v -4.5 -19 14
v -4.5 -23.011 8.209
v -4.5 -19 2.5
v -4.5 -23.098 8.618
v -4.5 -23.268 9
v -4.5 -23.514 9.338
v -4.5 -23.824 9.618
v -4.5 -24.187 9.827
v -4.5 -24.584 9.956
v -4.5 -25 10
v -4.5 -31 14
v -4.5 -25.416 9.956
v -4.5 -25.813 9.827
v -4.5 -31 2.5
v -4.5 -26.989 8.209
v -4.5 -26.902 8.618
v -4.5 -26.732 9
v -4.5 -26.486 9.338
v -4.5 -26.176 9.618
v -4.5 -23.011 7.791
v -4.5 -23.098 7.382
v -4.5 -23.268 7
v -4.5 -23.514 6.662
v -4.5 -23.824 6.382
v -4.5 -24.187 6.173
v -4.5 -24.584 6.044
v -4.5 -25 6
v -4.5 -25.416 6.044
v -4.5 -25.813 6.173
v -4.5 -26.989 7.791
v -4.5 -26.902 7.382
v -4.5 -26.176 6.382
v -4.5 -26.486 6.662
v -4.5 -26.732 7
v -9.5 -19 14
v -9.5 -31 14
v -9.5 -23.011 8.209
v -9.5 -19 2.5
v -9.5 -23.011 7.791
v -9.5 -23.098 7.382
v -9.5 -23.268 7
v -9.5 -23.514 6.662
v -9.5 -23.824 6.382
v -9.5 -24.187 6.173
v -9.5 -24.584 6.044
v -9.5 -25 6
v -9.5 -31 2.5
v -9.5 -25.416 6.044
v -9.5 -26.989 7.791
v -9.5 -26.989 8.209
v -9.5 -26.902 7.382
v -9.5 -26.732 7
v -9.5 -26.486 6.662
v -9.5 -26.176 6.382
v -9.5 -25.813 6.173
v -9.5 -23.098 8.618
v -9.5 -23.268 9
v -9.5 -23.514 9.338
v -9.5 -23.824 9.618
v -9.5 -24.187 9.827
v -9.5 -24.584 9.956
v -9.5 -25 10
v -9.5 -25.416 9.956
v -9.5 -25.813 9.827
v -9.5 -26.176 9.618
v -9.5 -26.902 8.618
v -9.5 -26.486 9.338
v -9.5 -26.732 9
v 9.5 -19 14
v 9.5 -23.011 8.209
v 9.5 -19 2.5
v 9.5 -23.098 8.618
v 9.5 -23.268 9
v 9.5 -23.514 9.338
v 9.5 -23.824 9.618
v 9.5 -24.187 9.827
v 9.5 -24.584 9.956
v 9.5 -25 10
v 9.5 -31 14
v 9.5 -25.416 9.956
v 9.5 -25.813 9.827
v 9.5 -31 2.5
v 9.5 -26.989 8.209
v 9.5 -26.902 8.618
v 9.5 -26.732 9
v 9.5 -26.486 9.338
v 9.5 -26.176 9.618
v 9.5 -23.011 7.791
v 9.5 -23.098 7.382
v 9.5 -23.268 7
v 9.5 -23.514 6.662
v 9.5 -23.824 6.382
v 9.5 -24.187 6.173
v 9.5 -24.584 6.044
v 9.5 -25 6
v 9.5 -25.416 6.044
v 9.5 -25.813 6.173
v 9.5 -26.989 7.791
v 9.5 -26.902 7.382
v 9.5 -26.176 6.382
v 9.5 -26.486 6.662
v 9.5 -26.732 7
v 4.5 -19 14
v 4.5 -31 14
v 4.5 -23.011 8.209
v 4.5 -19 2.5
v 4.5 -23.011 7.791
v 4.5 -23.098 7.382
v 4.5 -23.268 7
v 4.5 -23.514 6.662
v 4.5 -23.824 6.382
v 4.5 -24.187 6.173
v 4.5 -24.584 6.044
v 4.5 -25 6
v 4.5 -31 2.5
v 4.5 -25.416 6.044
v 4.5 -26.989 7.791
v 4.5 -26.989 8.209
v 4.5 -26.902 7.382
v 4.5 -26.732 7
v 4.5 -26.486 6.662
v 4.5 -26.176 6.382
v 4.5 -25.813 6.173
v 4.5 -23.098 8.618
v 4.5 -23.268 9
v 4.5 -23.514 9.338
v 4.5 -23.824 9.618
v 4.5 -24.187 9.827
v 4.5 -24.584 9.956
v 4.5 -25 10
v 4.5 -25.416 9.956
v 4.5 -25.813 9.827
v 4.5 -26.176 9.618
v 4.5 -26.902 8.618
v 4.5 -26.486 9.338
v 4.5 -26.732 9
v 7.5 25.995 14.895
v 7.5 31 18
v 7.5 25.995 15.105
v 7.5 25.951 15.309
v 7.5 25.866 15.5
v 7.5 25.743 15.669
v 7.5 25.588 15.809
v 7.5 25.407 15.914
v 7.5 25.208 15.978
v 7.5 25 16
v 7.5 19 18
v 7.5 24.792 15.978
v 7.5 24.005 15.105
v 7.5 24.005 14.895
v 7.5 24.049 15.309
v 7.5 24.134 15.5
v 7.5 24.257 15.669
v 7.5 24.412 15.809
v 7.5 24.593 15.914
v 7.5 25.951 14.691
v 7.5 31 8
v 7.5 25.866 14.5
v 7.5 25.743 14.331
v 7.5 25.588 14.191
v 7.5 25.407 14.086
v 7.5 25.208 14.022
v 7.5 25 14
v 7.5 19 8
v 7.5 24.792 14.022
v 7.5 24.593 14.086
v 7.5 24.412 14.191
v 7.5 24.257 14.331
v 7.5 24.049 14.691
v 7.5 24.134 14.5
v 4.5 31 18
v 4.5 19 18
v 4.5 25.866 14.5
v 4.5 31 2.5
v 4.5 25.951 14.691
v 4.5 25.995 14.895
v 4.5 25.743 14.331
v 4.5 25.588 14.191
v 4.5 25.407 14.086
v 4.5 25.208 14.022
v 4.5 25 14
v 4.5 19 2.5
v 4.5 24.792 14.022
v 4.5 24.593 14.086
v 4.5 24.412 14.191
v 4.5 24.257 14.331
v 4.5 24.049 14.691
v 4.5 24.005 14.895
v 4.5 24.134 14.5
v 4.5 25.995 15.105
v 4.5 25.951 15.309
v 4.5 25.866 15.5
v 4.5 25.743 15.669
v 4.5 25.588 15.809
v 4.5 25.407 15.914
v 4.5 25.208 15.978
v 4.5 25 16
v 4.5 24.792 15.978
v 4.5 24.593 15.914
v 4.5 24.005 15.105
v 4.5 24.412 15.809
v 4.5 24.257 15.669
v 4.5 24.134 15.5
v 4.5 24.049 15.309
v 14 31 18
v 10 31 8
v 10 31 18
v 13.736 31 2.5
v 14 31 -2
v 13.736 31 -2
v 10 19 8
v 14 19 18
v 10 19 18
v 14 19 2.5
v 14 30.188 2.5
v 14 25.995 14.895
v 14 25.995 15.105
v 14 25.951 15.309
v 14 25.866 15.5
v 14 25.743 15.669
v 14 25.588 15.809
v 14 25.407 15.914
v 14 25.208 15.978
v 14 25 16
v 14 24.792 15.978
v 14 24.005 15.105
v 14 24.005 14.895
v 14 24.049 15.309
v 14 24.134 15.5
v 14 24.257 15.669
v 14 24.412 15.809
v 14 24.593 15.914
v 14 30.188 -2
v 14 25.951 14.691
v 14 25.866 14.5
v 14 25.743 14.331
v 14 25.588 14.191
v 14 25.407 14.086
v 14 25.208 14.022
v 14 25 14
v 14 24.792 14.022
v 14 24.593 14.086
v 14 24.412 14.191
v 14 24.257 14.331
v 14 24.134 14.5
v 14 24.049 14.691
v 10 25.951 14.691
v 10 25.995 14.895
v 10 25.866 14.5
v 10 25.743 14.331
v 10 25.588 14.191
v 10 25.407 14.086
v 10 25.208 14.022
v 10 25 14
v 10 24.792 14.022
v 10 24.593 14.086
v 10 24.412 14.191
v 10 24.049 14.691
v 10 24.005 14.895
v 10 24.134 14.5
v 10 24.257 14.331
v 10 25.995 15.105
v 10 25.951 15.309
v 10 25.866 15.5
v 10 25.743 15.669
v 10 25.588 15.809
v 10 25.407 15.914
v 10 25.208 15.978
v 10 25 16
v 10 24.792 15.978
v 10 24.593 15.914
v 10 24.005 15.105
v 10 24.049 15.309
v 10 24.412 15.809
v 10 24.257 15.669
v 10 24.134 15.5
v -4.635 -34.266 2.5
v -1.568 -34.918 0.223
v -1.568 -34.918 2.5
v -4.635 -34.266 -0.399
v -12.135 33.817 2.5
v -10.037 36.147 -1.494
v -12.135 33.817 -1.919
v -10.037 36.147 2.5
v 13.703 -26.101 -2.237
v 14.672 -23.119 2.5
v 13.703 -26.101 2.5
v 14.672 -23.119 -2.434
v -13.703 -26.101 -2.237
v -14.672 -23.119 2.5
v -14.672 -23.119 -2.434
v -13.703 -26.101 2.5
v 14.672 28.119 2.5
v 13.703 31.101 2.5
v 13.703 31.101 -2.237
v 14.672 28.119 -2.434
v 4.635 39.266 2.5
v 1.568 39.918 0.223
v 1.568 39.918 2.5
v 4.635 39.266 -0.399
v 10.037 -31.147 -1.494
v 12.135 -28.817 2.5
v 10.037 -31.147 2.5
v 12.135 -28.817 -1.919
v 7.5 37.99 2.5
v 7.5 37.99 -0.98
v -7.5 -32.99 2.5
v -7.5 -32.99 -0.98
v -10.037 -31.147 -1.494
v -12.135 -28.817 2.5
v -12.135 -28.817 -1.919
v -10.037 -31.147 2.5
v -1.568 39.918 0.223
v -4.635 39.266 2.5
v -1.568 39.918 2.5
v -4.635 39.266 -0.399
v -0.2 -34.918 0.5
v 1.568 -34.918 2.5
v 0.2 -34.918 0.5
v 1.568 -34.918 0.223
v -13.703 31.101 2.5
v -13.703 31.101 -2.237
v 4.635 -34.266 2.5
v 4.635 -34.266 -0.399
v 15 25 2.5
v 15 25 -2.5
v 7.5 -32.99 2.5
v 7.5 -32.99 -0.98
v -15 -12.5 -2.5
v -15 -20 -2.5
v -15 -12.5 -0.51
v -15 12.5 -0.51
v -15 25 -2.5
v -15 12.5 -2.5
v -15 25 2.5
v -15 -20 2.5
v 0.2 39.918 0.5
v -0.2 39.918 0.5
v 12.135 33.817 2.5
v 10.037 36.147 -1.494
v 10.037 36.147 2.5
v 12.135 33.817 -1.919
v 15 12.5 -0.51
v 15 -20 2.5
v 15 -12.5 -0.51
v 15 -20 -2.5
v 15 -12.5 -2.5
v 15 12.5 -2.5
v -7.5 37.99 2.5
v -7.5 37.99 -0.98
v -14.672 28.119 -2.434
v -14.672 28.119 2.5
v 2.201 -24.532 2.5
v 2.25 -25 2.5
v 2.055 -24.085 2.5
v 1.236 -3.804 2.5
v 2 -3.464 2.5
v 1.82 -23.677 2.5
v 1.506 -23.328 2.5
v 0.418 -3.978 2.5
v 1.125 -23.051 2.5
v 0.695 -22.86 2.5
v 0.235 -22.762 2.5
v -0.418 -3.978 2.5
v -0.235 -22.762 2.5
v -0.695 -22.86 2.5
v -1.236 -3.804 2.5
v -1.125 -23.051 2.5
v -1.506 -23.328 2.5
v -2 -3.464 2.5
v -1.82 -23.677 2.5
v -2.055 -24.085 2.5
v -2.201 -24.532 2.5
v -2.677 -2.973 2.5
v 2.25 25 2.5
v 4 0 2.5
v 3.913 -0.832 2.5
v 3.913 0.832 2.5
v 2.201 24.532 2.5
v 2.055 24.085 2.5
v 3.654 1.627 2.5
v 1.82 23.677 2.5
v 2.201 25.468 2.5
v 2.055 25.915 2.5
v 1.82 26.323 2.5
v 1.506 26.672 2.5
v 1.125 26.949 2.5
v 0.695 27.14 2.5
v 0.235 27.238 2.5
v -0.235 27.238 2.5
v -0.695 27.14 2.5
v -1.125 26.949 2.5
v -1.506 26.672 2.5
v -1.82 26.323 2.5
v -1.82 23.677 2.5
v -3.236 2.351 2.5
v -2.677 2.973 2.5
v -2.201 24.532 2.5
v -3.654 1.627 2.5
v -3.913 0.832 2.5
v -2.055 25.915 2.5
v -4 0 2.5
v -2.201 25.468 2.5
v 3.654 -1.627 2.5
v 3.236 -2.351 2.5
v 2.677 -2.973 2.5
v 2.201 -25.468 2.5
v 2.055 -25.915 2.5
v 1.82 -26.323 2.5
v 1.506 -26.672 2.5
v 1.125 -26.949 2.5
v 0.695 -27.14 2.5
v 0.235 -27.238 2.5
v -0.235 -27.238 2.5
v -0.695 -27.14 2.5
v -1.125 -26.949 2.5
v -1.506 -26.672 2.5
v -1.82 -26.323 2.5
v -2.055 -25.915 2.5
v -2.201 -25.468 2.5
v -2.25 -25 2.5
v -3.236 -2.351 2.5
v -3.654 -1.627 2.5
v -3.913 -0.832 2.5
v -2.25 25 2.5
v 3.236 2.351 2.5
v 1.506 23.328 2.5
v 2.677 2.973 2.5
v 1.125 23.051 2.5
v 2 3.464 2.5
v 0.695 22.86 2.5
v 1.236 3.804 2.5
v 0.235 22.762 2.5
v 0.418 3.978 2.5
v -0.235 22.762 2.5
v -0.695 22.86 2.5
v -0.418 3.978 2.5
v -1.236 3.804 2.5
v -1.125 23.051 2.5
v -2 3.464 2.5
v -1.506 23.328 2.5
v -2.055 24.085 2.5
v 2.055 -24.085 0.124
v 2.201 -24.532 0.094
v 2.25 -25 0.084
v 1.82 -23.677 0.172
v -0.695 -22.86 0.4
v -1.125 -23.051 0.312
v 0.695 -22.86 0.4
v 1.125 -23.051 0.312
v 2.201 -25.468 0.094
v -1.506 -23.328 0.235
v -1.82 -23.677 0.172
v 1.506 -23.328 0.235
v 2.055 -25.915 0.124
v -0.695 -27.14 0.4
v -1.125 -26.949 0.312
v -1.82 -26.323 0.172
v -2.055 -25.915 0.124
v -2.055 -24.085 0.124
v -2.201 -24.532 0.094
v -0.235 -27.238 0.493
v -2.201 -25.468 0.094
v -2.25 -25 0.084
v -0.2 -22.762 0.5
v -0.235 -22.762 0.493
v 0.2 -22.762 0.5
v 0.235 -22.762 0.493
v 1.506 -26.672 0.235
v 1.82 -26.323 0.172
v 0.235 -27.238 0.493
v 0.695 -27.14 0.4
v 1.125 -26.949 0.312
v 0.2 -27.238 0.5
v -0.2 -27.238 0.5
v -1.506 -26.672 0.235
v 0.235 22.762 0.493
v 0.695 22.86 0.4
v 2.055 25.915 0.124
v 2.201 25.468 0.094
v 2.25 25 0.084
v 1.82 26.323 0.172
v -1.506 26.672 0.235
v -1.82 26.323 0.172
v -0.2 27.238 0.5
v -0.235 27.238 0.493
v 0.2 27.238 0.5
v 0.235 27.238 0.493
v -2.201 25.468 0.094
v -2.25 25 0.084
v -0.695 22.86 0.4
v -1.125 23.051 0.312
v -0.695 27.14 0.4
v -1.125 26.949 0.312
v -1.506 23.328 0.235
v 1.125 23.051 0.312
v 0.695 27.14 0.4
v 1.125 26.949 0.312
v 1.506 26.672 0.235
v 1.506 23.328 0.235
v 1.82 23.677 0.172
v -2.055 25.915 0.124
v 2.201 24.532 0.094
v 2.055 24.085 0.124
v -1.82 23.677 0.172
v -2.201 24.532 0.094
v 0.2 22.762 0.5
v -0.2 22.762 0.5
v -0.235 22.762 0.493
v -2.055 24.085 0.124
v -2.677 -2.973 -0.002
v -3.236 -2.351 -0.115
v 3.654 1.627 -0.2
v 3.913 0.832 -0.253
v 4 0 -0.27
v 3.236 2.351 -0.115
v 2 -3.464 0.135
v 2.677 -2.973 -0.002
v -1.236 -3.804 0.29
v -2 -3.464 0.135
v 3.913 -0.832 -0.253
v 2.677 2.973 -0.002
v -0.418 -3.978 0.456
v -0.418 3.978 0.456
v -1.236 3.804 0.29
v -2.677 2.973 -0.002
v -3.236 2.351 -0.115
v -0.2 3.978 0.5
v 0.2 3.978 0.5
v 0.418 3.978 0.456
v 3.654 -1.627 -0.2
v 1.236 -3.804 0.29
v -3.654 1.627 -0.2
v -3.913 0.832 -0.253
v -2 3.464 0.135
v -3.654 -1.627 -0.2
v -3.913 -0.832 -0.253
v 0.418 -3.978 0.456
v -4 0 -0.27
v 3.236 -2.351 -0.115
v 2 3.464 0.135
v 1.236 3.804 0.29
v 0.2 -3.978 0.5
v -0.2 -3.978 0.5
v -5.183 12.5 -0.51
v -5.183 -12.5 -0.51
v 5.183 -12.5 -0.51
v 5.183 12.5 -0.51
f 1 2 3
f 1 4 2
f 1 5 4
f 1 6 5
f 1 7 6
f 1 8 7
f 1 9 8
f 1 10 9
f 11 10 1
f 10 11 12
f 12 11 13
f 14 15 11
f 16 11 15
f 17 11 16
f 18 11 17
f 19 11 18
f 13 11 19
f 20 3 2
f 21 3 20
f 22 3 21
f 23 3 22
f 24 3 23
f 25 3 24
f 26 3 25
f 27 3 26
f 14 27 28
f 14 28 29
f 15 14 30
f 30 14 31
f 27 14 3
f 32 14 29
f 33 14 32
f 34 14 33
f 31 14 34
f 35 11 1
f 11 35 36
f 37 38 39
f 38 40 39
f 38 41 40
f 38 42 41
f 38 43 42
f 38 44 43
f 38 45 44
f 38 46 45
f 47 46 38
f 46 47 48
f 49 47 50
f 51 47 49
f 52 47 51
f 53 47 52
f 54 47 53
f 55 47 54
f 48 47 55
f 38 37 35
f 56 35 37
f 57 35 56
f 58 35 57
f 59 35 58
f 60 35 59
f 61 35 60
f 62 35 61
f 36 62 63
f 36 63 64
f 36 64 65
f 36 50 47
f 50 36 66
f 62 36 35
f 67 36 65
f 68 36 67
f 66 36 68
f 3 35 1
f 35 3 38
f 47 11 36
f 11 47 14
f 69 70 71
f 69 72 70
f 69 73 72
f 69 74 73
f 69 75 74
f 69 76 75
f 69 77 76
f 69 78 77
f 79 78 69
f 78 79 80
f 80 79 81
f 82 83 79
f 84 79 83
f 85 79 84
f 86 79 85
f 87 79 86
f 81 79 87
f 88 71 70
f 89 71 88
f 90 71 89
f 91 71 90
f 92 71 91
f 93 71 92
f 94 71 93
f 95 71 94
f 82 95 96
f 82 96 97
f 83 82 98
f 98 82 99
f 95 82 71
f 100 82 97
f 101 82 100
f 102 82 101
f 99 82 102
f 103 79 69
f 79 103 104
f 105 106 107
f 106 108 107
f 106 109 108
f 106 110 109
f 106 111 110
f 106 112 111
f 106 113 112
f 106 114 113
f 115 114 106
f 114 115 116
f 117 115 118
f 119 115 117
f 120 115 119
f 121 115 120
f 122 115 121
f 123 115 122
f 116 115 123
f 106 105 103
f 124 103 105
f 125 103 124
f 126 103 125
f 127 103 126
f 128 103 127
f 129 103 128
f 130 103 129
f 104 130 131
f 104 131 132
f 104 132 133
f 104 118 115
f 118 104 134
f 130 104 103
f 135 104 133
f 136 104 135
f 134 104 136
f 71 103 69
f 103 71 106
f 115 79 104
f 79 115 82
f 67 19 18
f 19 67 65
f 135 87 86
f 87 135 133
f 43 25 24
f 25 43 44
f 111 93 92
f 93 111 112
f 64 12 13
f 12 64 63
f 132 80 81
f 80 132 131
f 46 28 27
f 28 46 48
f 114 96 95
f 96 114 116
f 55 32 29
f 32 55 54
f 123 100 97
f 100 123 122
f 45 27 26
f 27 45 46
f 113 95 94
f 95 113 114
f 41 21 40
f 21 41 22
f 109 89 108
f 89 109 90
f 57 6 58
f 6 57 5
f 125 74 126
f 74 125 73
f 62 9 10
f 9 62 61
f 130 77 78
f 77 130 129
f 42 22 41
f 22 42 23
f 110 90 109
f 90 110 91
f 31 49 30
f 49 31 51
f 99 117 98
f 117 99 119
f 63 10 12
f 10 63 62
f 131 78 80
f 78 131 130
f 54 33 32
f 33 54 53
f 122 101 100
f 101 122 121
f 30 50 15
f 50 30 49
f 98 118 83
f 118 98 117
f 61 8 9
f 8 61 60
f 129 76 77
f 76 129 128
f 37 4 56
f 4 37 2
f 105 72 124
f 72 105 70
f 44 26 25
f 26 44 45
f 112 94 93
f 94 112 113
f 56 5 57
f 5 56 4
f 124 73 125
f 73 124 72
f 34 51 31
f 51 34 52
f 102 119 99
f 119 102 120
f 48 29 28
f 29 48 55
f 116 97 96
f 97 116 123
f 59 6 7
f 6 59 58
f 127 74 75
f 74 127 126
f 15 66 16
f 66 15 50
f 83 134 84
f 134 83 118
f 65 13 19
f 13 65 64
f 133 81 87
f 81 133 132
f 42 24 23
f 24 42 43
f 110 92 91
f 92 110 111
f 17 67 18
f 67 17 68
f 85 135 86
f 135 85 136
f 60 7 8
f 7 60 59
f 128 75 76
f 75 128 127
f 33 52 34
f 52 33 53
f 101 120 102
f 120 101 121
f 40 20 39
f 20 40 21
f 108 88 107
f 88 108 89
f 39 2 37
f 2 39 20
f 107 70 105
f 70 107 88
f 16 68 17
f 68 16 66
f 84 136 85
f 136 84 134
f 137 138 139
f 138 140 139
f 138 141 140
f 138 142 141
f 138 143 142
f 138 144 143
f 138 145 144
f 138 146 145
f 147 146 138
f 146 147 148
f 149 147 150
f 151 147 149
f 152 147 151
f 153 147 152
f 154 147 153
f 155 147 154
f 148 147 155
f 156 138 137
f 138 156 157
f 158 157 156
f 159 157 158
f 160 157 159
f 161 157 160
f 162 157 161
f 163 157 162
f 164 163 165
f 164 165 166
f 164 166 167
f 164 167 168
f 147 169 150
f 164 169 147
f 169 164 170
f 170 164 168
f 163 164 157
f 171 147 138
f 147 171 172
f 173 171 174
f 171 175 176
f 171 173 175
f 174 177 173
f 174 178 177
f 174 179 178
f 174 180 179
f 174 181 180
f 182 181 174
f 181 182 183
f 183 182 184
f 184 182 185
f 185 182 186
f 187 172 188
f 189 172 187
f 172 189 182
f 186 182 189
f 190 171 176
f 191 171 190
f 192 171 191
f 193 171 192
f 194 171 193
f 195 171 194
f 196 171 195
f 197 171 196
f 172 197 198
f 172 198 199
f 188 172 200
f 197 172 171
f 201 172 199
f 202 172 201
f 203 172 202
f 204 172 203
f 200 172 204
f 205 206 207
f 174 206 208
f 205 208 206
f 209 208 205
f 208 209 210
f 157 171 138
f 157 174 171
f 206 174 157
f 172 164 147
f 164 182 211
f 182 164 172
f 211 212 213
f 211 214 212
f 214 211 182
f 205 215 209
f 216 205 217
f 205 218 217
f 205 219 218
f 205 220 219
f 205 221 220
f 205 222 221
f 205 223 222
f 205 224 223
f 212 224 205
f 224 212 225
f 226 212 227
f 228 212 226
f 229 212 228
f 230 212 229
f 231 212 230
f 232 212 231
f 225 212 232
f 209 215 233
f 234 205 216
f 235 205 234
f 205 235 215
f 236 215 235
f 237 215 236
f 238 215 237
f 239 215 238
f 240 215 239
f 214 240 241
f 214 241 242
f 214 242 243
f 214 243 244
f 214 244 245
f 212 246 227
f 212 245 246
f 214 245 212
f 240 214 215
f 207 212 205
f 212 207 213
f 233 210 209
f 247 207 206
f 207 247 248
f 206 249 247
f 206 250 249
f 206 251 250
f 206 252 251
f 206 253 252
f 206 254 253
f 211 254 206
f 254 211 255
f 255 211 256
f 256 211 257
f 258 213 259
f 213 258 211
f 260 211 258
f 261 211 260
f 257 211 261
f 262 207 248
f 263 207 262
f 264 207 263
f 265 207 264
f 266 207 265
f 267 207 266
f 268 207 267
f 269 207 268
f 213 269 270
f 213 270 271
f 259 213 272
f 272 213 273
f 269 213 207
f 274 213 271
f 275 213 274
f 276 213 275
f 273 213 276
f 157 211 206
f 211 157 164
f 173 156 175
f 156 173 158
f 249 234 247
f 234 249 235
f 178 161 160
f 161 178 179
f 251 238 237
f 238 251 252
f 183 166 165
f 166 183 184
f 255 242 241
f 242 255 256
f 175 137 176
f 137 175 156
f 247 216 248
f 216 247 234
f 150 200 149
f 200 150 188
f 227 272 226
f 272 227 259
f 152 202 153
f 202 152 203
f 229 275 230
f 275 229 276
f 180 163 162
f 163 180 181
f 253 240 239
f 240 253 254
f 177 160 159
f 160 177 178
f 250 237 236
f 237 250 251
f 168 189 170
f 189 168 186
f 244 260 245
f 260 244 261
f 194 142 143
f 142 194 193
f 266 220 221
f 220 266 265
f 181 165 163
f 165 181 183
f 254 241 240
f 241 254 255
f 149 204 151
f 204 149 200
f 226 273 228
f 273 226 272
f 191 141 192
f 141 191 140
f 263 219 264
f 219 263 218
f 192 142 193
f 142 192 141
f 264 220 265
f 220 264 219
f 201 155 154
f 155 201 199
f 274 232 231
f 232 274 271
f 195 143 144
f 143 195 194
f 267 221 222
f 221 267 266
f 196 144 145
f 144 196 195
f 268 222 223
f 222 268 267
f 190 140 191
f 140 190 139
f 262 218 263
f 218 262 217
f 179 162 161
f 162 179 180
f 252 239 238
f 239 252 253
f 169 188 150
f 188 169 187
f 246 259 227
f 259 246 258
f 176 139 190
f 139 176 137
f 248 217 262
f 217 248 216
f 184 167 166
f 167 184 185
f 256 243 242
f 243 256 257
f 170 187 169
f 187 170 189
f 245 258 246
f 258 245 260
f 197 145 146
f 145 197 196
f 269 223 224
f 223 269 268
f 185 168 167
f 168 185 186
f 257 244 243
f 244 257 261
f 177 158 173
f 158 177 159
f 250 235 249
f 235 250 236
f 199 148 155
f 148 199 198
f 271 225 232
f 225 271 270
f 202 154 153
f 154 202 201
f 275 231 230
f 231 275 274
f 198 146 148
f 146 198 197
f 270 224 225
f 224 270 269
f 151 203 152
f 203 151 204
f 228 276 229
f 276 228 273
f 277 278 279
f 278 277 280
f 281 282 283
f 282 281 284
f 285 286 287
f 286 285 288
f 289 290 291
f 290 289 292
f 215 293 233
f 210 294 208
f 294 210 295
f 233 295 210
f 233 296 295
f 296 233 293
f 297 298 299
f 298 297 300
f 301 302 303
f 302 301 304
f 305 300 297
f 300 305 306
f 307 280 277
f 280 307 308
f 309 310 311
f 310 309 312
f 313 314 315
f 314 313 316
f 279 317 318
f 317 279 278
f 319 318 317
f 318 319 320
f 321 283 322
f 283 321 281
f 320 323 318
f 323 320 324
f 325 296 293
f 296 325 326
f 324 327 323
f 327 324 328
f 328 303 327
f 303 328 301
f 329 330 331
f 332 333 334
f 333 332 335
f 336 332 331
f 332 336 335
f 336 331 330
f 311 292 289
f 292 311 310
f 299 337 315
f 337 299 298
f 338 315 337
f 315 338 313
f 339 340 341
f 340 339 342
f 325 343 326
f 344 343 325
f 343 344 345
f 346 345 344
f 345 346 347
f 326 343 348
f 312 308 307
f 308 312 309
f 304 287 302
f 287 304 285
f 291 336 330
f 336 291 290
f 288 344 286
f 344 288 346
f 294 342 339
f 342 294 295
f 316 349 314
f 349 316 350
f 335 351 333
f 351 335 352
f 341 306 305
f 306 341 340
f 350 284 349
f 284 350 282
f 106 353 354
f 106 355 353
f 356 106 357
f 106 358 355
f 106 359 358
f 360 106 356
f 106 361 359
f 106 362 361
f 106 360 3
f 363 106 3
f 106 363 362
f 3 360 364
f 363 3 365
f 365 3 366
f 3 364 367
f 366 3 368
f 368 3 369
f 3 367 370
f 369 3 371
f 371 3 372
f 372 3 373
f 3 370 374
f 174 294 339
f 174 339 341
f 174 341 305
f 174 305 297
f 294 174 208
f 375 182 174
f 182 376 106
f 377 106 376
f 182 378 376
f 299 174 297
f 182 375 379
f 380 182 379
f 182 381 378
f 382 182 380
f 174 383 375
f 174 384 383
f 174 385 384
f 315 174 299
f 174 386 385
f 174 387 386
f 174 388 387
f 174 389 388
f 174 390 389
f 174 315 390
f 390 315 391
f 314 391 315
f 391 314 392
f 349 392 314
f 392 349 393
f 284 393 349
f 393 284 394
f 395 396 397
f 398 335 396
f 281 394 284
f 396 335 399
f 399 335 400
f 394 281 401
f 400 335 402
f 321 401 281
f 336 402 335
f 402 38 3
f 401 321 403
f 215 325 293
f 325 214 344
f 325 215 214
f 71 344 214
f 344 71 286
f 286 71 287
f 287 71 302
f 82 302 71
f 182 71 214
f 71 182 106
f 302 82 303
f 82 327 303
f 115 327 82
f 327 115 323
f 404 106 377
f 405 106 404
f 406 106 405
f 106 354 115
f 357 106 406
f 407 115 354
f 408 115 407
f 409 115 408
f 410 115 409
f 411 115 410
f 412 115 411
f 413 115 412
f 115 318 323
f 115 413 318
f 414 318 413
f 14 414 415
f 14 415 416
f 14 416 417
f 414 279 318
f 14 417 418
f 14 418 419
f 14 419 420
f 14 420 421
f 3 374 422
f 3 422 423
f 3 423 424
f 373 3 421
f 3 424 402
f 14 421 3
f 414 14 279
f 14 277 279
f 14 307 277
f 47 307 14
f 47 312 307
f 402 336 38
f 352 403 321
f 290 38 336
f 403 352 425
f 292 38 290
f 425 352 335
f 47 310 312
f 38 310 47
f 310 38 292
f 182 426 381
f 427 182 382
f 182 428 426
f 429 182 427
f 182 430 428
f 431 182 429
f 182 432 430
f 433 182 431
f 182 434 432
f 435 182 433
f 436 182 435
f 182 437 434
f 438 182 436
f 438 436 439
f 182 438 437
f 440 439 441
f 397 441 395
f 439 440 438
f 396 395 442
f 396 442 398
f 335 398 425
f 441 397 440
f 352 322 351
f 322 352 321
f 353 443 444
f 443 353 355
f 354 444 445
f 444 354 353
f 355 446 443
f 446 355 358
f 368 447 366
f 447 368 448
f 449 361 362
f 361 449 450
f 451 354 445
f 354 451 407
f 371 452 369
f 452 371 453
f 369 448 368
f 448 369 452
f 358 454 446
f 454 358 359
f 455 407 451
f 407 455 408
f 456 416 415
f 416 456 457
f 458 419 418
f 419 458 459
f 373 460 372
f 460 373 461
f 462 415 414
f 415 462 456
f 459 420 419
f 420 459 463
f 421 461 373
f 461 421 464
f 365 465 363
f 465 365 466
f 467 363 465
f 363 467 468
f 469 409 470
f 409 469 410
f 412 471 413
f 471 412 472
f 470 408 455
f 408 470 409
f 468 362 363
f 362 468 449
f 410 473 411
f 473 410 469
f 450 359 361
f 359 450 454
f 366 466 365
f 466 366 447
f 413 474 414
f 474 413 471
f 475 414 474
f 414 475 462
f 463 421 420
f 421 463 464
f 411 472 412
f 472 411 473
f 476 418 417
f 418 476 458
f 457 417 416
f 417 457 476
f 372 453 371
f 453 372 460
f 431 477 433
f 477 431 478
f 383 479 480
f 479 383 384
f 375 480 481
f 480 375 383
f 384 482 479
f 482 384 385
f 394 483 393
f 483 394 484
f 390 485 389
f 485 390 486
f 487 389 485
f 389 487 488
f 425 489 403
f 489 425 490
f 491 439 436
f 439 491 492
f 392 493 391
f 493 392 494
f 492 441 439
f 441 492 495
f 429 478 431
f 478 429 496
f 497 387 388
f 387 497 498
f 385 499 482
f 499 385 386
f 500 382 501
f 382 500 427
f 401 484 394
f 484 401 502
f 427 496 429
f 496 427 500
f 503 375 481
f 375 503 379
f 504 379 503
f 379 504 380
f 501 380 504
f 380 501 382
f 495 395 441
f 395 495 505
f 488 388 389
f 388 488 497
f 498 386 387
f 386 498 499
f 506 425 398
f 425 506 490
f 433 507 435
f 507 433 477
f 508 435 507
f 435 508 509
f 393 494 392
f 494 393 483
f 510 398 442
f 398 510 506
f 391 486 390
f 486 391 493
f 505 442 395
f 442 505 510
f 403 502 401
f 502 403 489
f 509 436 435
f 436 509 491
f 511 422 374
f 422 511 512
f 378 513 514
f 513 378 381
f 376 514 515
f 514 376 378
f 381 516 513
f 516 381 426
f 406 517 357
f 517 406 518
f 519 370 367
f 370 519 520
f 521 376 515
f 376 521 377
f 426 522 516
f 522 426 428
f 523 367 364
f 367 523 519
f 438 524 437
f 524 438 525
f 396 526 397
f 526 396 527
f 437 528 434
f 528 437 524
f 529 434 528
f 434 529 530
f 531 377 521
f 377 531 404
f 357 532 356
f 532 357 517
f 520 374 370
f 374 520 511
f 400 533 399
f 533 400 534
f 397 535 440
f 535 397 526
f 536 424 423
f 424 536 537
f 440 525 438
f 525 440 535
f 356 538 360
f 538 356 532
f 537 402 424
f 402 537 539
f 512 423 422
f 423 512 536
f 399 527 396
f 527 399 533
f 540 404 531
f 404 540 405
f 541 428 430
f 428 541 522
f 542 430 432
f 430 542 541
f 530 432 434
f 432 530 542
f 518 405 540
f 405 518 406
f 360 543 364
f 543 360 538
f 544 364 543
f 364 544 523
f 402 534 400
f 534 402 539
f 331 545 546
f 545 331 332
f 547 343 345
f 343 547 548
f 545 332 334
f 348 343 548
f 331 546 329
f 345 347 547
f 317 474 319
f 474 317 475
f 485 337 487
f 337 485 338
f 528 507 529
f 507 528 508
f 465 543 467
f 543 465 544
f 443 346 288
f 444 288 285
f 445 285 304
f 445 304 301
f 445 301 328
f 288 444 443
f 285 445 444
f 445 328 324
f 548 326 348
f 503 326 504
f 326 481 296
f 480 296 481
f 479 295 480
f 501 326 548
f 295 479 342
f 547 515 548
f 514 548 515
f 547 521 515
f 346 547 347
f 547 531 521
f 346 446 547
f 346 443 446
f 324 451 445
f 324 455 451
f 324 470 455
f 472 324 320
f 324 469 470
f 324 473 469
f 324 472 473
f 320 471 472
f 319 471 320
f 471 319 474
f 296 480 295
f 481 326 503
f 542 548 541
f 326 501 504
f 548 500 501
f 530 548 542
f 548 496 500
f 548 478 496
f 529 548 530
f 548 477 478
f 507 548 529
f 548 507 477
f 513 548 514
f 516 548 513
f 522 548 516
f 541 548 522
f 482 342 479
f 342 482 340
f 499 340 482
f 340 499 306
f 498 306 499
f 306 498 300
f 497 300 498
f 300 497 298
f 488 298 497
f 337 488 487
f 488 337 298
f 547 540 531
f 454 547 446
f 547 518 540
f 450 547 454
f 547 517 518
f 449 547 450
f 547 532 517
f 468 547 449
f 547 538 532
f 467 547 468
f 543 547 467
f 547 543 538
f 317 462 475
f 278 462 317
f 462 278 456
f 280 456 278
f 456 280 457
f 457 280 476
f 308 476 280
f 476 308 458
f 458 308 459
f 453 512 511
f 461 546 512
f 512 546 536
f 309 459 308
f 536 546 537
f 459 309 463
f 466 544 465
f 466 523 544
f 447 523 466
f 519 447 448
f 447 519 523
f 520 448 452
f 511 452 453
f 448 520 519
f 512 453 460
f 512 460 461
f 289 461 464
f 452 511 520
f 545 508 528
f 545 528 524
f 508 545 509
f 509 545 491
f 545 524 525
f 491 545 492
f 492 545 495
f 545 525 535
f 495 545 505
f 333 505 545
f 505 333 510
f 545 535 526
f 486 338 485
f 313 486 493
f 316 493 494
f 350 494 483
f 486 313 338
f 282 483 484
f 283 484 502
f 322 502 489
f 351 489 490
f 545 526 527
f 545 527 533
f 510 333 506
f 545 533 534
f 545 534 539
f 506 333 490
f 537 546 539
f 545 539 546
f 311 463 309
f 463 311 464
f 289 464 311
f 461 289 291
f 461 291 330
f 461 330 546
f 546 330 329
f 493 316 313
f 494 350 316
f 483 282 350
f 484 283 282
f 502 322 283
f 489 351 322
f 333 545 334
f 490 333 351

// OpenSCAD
$fn = 30;

// not recommended but if you dont have flat screws
counterbore = "off"; //["on", "off"]
screwoffset = 25;




translate([0,0,8])
rotate([90,0,180])
%servo();
difference(){
    union(){
    hull(){
        translate([0,-20,0])
            cylinder(h=5, d=30, center=true);
        translate([0,+25,0])
            cylinder(h=5, d=30, center=true);
    }
    translate([0,-screwoffset,8]){ 
        bandFix();
        }
    translate([9,screwoffset,8]){ 
        wireFix();
        }
    }
    
    translate([0,-screwoffset,-0.49]){
         screw();         
    }
    translate([0,screwoffset,-0.49])
         screw();
    //cableInlet
    screw(hole = 8);
    
    //strap
    translate([0,0,-1.51])
         cube([32, 25,2], center = true); 
    // fusulage shape
    translate([-15,55,-2.5])
    rotate([0,0,-90])
        trapez3d();
}


module servo(){
    translate([0,0,0])
        cube([24, 12,28], center = true); 
    translate([5,8,16])
        cube([5, 20,4], center = true); 
    translate([0,0,7])
        cube([32, 12,3], center = true); 
}

module bandFix(){
    difference(){
        union(){
        translate([-7,0,0])
            cube([5,12,12], center=true);
        translate([7,0,0])
            cube([5,12,12], center=true);
        }
        rotate([0,90,0])
        #cylinder(h=50, d=4, center=true);
    }
}
module wireFix(){
    difference(){
        union(){
        translate([-3,0,0])
            cube([3,12,20], center=true);
        translate([3,0,0])
            cube([4,12,20], center=true);
        translate([0,0,-3])
            cube([4,12,6], center=true);
        }
        
        translate([0,0,7])
        rotate([0,90,0])
        #cylinder(h=50, d=2, center=true);
    }
}


module screw(hole = 4.5, height=3, head = 8){
    cylinder(30,d=hole, center=true);
    if(counterbore != "off"){
        cylinder(h = height, d1 = hole, d2 = head);
    }
}


module trapez(bottom = 30, top = 25, height = 10){
    off = (bottom-top);
    CubePoints = [
  [  0,  0,  0 ],  //0
  [ 0,  bottom,  0 ],  //1
  [ 0,  bottom-off,  height ],  //2
  [  0,  off,  height ]  //3
];
CubeFaces = [
  [0,1,2,3]  // bottom
  ]; // left

polyhedron( CubePoints, CubeFaces );
}



module trapez3d(bottom = 30, top = 14.8, height = 3, length = 120){
    hull(){
            trapez(bottom, top, height);
            translate([length,0,0])
            trapez(bottom, top, height);
    }
}
